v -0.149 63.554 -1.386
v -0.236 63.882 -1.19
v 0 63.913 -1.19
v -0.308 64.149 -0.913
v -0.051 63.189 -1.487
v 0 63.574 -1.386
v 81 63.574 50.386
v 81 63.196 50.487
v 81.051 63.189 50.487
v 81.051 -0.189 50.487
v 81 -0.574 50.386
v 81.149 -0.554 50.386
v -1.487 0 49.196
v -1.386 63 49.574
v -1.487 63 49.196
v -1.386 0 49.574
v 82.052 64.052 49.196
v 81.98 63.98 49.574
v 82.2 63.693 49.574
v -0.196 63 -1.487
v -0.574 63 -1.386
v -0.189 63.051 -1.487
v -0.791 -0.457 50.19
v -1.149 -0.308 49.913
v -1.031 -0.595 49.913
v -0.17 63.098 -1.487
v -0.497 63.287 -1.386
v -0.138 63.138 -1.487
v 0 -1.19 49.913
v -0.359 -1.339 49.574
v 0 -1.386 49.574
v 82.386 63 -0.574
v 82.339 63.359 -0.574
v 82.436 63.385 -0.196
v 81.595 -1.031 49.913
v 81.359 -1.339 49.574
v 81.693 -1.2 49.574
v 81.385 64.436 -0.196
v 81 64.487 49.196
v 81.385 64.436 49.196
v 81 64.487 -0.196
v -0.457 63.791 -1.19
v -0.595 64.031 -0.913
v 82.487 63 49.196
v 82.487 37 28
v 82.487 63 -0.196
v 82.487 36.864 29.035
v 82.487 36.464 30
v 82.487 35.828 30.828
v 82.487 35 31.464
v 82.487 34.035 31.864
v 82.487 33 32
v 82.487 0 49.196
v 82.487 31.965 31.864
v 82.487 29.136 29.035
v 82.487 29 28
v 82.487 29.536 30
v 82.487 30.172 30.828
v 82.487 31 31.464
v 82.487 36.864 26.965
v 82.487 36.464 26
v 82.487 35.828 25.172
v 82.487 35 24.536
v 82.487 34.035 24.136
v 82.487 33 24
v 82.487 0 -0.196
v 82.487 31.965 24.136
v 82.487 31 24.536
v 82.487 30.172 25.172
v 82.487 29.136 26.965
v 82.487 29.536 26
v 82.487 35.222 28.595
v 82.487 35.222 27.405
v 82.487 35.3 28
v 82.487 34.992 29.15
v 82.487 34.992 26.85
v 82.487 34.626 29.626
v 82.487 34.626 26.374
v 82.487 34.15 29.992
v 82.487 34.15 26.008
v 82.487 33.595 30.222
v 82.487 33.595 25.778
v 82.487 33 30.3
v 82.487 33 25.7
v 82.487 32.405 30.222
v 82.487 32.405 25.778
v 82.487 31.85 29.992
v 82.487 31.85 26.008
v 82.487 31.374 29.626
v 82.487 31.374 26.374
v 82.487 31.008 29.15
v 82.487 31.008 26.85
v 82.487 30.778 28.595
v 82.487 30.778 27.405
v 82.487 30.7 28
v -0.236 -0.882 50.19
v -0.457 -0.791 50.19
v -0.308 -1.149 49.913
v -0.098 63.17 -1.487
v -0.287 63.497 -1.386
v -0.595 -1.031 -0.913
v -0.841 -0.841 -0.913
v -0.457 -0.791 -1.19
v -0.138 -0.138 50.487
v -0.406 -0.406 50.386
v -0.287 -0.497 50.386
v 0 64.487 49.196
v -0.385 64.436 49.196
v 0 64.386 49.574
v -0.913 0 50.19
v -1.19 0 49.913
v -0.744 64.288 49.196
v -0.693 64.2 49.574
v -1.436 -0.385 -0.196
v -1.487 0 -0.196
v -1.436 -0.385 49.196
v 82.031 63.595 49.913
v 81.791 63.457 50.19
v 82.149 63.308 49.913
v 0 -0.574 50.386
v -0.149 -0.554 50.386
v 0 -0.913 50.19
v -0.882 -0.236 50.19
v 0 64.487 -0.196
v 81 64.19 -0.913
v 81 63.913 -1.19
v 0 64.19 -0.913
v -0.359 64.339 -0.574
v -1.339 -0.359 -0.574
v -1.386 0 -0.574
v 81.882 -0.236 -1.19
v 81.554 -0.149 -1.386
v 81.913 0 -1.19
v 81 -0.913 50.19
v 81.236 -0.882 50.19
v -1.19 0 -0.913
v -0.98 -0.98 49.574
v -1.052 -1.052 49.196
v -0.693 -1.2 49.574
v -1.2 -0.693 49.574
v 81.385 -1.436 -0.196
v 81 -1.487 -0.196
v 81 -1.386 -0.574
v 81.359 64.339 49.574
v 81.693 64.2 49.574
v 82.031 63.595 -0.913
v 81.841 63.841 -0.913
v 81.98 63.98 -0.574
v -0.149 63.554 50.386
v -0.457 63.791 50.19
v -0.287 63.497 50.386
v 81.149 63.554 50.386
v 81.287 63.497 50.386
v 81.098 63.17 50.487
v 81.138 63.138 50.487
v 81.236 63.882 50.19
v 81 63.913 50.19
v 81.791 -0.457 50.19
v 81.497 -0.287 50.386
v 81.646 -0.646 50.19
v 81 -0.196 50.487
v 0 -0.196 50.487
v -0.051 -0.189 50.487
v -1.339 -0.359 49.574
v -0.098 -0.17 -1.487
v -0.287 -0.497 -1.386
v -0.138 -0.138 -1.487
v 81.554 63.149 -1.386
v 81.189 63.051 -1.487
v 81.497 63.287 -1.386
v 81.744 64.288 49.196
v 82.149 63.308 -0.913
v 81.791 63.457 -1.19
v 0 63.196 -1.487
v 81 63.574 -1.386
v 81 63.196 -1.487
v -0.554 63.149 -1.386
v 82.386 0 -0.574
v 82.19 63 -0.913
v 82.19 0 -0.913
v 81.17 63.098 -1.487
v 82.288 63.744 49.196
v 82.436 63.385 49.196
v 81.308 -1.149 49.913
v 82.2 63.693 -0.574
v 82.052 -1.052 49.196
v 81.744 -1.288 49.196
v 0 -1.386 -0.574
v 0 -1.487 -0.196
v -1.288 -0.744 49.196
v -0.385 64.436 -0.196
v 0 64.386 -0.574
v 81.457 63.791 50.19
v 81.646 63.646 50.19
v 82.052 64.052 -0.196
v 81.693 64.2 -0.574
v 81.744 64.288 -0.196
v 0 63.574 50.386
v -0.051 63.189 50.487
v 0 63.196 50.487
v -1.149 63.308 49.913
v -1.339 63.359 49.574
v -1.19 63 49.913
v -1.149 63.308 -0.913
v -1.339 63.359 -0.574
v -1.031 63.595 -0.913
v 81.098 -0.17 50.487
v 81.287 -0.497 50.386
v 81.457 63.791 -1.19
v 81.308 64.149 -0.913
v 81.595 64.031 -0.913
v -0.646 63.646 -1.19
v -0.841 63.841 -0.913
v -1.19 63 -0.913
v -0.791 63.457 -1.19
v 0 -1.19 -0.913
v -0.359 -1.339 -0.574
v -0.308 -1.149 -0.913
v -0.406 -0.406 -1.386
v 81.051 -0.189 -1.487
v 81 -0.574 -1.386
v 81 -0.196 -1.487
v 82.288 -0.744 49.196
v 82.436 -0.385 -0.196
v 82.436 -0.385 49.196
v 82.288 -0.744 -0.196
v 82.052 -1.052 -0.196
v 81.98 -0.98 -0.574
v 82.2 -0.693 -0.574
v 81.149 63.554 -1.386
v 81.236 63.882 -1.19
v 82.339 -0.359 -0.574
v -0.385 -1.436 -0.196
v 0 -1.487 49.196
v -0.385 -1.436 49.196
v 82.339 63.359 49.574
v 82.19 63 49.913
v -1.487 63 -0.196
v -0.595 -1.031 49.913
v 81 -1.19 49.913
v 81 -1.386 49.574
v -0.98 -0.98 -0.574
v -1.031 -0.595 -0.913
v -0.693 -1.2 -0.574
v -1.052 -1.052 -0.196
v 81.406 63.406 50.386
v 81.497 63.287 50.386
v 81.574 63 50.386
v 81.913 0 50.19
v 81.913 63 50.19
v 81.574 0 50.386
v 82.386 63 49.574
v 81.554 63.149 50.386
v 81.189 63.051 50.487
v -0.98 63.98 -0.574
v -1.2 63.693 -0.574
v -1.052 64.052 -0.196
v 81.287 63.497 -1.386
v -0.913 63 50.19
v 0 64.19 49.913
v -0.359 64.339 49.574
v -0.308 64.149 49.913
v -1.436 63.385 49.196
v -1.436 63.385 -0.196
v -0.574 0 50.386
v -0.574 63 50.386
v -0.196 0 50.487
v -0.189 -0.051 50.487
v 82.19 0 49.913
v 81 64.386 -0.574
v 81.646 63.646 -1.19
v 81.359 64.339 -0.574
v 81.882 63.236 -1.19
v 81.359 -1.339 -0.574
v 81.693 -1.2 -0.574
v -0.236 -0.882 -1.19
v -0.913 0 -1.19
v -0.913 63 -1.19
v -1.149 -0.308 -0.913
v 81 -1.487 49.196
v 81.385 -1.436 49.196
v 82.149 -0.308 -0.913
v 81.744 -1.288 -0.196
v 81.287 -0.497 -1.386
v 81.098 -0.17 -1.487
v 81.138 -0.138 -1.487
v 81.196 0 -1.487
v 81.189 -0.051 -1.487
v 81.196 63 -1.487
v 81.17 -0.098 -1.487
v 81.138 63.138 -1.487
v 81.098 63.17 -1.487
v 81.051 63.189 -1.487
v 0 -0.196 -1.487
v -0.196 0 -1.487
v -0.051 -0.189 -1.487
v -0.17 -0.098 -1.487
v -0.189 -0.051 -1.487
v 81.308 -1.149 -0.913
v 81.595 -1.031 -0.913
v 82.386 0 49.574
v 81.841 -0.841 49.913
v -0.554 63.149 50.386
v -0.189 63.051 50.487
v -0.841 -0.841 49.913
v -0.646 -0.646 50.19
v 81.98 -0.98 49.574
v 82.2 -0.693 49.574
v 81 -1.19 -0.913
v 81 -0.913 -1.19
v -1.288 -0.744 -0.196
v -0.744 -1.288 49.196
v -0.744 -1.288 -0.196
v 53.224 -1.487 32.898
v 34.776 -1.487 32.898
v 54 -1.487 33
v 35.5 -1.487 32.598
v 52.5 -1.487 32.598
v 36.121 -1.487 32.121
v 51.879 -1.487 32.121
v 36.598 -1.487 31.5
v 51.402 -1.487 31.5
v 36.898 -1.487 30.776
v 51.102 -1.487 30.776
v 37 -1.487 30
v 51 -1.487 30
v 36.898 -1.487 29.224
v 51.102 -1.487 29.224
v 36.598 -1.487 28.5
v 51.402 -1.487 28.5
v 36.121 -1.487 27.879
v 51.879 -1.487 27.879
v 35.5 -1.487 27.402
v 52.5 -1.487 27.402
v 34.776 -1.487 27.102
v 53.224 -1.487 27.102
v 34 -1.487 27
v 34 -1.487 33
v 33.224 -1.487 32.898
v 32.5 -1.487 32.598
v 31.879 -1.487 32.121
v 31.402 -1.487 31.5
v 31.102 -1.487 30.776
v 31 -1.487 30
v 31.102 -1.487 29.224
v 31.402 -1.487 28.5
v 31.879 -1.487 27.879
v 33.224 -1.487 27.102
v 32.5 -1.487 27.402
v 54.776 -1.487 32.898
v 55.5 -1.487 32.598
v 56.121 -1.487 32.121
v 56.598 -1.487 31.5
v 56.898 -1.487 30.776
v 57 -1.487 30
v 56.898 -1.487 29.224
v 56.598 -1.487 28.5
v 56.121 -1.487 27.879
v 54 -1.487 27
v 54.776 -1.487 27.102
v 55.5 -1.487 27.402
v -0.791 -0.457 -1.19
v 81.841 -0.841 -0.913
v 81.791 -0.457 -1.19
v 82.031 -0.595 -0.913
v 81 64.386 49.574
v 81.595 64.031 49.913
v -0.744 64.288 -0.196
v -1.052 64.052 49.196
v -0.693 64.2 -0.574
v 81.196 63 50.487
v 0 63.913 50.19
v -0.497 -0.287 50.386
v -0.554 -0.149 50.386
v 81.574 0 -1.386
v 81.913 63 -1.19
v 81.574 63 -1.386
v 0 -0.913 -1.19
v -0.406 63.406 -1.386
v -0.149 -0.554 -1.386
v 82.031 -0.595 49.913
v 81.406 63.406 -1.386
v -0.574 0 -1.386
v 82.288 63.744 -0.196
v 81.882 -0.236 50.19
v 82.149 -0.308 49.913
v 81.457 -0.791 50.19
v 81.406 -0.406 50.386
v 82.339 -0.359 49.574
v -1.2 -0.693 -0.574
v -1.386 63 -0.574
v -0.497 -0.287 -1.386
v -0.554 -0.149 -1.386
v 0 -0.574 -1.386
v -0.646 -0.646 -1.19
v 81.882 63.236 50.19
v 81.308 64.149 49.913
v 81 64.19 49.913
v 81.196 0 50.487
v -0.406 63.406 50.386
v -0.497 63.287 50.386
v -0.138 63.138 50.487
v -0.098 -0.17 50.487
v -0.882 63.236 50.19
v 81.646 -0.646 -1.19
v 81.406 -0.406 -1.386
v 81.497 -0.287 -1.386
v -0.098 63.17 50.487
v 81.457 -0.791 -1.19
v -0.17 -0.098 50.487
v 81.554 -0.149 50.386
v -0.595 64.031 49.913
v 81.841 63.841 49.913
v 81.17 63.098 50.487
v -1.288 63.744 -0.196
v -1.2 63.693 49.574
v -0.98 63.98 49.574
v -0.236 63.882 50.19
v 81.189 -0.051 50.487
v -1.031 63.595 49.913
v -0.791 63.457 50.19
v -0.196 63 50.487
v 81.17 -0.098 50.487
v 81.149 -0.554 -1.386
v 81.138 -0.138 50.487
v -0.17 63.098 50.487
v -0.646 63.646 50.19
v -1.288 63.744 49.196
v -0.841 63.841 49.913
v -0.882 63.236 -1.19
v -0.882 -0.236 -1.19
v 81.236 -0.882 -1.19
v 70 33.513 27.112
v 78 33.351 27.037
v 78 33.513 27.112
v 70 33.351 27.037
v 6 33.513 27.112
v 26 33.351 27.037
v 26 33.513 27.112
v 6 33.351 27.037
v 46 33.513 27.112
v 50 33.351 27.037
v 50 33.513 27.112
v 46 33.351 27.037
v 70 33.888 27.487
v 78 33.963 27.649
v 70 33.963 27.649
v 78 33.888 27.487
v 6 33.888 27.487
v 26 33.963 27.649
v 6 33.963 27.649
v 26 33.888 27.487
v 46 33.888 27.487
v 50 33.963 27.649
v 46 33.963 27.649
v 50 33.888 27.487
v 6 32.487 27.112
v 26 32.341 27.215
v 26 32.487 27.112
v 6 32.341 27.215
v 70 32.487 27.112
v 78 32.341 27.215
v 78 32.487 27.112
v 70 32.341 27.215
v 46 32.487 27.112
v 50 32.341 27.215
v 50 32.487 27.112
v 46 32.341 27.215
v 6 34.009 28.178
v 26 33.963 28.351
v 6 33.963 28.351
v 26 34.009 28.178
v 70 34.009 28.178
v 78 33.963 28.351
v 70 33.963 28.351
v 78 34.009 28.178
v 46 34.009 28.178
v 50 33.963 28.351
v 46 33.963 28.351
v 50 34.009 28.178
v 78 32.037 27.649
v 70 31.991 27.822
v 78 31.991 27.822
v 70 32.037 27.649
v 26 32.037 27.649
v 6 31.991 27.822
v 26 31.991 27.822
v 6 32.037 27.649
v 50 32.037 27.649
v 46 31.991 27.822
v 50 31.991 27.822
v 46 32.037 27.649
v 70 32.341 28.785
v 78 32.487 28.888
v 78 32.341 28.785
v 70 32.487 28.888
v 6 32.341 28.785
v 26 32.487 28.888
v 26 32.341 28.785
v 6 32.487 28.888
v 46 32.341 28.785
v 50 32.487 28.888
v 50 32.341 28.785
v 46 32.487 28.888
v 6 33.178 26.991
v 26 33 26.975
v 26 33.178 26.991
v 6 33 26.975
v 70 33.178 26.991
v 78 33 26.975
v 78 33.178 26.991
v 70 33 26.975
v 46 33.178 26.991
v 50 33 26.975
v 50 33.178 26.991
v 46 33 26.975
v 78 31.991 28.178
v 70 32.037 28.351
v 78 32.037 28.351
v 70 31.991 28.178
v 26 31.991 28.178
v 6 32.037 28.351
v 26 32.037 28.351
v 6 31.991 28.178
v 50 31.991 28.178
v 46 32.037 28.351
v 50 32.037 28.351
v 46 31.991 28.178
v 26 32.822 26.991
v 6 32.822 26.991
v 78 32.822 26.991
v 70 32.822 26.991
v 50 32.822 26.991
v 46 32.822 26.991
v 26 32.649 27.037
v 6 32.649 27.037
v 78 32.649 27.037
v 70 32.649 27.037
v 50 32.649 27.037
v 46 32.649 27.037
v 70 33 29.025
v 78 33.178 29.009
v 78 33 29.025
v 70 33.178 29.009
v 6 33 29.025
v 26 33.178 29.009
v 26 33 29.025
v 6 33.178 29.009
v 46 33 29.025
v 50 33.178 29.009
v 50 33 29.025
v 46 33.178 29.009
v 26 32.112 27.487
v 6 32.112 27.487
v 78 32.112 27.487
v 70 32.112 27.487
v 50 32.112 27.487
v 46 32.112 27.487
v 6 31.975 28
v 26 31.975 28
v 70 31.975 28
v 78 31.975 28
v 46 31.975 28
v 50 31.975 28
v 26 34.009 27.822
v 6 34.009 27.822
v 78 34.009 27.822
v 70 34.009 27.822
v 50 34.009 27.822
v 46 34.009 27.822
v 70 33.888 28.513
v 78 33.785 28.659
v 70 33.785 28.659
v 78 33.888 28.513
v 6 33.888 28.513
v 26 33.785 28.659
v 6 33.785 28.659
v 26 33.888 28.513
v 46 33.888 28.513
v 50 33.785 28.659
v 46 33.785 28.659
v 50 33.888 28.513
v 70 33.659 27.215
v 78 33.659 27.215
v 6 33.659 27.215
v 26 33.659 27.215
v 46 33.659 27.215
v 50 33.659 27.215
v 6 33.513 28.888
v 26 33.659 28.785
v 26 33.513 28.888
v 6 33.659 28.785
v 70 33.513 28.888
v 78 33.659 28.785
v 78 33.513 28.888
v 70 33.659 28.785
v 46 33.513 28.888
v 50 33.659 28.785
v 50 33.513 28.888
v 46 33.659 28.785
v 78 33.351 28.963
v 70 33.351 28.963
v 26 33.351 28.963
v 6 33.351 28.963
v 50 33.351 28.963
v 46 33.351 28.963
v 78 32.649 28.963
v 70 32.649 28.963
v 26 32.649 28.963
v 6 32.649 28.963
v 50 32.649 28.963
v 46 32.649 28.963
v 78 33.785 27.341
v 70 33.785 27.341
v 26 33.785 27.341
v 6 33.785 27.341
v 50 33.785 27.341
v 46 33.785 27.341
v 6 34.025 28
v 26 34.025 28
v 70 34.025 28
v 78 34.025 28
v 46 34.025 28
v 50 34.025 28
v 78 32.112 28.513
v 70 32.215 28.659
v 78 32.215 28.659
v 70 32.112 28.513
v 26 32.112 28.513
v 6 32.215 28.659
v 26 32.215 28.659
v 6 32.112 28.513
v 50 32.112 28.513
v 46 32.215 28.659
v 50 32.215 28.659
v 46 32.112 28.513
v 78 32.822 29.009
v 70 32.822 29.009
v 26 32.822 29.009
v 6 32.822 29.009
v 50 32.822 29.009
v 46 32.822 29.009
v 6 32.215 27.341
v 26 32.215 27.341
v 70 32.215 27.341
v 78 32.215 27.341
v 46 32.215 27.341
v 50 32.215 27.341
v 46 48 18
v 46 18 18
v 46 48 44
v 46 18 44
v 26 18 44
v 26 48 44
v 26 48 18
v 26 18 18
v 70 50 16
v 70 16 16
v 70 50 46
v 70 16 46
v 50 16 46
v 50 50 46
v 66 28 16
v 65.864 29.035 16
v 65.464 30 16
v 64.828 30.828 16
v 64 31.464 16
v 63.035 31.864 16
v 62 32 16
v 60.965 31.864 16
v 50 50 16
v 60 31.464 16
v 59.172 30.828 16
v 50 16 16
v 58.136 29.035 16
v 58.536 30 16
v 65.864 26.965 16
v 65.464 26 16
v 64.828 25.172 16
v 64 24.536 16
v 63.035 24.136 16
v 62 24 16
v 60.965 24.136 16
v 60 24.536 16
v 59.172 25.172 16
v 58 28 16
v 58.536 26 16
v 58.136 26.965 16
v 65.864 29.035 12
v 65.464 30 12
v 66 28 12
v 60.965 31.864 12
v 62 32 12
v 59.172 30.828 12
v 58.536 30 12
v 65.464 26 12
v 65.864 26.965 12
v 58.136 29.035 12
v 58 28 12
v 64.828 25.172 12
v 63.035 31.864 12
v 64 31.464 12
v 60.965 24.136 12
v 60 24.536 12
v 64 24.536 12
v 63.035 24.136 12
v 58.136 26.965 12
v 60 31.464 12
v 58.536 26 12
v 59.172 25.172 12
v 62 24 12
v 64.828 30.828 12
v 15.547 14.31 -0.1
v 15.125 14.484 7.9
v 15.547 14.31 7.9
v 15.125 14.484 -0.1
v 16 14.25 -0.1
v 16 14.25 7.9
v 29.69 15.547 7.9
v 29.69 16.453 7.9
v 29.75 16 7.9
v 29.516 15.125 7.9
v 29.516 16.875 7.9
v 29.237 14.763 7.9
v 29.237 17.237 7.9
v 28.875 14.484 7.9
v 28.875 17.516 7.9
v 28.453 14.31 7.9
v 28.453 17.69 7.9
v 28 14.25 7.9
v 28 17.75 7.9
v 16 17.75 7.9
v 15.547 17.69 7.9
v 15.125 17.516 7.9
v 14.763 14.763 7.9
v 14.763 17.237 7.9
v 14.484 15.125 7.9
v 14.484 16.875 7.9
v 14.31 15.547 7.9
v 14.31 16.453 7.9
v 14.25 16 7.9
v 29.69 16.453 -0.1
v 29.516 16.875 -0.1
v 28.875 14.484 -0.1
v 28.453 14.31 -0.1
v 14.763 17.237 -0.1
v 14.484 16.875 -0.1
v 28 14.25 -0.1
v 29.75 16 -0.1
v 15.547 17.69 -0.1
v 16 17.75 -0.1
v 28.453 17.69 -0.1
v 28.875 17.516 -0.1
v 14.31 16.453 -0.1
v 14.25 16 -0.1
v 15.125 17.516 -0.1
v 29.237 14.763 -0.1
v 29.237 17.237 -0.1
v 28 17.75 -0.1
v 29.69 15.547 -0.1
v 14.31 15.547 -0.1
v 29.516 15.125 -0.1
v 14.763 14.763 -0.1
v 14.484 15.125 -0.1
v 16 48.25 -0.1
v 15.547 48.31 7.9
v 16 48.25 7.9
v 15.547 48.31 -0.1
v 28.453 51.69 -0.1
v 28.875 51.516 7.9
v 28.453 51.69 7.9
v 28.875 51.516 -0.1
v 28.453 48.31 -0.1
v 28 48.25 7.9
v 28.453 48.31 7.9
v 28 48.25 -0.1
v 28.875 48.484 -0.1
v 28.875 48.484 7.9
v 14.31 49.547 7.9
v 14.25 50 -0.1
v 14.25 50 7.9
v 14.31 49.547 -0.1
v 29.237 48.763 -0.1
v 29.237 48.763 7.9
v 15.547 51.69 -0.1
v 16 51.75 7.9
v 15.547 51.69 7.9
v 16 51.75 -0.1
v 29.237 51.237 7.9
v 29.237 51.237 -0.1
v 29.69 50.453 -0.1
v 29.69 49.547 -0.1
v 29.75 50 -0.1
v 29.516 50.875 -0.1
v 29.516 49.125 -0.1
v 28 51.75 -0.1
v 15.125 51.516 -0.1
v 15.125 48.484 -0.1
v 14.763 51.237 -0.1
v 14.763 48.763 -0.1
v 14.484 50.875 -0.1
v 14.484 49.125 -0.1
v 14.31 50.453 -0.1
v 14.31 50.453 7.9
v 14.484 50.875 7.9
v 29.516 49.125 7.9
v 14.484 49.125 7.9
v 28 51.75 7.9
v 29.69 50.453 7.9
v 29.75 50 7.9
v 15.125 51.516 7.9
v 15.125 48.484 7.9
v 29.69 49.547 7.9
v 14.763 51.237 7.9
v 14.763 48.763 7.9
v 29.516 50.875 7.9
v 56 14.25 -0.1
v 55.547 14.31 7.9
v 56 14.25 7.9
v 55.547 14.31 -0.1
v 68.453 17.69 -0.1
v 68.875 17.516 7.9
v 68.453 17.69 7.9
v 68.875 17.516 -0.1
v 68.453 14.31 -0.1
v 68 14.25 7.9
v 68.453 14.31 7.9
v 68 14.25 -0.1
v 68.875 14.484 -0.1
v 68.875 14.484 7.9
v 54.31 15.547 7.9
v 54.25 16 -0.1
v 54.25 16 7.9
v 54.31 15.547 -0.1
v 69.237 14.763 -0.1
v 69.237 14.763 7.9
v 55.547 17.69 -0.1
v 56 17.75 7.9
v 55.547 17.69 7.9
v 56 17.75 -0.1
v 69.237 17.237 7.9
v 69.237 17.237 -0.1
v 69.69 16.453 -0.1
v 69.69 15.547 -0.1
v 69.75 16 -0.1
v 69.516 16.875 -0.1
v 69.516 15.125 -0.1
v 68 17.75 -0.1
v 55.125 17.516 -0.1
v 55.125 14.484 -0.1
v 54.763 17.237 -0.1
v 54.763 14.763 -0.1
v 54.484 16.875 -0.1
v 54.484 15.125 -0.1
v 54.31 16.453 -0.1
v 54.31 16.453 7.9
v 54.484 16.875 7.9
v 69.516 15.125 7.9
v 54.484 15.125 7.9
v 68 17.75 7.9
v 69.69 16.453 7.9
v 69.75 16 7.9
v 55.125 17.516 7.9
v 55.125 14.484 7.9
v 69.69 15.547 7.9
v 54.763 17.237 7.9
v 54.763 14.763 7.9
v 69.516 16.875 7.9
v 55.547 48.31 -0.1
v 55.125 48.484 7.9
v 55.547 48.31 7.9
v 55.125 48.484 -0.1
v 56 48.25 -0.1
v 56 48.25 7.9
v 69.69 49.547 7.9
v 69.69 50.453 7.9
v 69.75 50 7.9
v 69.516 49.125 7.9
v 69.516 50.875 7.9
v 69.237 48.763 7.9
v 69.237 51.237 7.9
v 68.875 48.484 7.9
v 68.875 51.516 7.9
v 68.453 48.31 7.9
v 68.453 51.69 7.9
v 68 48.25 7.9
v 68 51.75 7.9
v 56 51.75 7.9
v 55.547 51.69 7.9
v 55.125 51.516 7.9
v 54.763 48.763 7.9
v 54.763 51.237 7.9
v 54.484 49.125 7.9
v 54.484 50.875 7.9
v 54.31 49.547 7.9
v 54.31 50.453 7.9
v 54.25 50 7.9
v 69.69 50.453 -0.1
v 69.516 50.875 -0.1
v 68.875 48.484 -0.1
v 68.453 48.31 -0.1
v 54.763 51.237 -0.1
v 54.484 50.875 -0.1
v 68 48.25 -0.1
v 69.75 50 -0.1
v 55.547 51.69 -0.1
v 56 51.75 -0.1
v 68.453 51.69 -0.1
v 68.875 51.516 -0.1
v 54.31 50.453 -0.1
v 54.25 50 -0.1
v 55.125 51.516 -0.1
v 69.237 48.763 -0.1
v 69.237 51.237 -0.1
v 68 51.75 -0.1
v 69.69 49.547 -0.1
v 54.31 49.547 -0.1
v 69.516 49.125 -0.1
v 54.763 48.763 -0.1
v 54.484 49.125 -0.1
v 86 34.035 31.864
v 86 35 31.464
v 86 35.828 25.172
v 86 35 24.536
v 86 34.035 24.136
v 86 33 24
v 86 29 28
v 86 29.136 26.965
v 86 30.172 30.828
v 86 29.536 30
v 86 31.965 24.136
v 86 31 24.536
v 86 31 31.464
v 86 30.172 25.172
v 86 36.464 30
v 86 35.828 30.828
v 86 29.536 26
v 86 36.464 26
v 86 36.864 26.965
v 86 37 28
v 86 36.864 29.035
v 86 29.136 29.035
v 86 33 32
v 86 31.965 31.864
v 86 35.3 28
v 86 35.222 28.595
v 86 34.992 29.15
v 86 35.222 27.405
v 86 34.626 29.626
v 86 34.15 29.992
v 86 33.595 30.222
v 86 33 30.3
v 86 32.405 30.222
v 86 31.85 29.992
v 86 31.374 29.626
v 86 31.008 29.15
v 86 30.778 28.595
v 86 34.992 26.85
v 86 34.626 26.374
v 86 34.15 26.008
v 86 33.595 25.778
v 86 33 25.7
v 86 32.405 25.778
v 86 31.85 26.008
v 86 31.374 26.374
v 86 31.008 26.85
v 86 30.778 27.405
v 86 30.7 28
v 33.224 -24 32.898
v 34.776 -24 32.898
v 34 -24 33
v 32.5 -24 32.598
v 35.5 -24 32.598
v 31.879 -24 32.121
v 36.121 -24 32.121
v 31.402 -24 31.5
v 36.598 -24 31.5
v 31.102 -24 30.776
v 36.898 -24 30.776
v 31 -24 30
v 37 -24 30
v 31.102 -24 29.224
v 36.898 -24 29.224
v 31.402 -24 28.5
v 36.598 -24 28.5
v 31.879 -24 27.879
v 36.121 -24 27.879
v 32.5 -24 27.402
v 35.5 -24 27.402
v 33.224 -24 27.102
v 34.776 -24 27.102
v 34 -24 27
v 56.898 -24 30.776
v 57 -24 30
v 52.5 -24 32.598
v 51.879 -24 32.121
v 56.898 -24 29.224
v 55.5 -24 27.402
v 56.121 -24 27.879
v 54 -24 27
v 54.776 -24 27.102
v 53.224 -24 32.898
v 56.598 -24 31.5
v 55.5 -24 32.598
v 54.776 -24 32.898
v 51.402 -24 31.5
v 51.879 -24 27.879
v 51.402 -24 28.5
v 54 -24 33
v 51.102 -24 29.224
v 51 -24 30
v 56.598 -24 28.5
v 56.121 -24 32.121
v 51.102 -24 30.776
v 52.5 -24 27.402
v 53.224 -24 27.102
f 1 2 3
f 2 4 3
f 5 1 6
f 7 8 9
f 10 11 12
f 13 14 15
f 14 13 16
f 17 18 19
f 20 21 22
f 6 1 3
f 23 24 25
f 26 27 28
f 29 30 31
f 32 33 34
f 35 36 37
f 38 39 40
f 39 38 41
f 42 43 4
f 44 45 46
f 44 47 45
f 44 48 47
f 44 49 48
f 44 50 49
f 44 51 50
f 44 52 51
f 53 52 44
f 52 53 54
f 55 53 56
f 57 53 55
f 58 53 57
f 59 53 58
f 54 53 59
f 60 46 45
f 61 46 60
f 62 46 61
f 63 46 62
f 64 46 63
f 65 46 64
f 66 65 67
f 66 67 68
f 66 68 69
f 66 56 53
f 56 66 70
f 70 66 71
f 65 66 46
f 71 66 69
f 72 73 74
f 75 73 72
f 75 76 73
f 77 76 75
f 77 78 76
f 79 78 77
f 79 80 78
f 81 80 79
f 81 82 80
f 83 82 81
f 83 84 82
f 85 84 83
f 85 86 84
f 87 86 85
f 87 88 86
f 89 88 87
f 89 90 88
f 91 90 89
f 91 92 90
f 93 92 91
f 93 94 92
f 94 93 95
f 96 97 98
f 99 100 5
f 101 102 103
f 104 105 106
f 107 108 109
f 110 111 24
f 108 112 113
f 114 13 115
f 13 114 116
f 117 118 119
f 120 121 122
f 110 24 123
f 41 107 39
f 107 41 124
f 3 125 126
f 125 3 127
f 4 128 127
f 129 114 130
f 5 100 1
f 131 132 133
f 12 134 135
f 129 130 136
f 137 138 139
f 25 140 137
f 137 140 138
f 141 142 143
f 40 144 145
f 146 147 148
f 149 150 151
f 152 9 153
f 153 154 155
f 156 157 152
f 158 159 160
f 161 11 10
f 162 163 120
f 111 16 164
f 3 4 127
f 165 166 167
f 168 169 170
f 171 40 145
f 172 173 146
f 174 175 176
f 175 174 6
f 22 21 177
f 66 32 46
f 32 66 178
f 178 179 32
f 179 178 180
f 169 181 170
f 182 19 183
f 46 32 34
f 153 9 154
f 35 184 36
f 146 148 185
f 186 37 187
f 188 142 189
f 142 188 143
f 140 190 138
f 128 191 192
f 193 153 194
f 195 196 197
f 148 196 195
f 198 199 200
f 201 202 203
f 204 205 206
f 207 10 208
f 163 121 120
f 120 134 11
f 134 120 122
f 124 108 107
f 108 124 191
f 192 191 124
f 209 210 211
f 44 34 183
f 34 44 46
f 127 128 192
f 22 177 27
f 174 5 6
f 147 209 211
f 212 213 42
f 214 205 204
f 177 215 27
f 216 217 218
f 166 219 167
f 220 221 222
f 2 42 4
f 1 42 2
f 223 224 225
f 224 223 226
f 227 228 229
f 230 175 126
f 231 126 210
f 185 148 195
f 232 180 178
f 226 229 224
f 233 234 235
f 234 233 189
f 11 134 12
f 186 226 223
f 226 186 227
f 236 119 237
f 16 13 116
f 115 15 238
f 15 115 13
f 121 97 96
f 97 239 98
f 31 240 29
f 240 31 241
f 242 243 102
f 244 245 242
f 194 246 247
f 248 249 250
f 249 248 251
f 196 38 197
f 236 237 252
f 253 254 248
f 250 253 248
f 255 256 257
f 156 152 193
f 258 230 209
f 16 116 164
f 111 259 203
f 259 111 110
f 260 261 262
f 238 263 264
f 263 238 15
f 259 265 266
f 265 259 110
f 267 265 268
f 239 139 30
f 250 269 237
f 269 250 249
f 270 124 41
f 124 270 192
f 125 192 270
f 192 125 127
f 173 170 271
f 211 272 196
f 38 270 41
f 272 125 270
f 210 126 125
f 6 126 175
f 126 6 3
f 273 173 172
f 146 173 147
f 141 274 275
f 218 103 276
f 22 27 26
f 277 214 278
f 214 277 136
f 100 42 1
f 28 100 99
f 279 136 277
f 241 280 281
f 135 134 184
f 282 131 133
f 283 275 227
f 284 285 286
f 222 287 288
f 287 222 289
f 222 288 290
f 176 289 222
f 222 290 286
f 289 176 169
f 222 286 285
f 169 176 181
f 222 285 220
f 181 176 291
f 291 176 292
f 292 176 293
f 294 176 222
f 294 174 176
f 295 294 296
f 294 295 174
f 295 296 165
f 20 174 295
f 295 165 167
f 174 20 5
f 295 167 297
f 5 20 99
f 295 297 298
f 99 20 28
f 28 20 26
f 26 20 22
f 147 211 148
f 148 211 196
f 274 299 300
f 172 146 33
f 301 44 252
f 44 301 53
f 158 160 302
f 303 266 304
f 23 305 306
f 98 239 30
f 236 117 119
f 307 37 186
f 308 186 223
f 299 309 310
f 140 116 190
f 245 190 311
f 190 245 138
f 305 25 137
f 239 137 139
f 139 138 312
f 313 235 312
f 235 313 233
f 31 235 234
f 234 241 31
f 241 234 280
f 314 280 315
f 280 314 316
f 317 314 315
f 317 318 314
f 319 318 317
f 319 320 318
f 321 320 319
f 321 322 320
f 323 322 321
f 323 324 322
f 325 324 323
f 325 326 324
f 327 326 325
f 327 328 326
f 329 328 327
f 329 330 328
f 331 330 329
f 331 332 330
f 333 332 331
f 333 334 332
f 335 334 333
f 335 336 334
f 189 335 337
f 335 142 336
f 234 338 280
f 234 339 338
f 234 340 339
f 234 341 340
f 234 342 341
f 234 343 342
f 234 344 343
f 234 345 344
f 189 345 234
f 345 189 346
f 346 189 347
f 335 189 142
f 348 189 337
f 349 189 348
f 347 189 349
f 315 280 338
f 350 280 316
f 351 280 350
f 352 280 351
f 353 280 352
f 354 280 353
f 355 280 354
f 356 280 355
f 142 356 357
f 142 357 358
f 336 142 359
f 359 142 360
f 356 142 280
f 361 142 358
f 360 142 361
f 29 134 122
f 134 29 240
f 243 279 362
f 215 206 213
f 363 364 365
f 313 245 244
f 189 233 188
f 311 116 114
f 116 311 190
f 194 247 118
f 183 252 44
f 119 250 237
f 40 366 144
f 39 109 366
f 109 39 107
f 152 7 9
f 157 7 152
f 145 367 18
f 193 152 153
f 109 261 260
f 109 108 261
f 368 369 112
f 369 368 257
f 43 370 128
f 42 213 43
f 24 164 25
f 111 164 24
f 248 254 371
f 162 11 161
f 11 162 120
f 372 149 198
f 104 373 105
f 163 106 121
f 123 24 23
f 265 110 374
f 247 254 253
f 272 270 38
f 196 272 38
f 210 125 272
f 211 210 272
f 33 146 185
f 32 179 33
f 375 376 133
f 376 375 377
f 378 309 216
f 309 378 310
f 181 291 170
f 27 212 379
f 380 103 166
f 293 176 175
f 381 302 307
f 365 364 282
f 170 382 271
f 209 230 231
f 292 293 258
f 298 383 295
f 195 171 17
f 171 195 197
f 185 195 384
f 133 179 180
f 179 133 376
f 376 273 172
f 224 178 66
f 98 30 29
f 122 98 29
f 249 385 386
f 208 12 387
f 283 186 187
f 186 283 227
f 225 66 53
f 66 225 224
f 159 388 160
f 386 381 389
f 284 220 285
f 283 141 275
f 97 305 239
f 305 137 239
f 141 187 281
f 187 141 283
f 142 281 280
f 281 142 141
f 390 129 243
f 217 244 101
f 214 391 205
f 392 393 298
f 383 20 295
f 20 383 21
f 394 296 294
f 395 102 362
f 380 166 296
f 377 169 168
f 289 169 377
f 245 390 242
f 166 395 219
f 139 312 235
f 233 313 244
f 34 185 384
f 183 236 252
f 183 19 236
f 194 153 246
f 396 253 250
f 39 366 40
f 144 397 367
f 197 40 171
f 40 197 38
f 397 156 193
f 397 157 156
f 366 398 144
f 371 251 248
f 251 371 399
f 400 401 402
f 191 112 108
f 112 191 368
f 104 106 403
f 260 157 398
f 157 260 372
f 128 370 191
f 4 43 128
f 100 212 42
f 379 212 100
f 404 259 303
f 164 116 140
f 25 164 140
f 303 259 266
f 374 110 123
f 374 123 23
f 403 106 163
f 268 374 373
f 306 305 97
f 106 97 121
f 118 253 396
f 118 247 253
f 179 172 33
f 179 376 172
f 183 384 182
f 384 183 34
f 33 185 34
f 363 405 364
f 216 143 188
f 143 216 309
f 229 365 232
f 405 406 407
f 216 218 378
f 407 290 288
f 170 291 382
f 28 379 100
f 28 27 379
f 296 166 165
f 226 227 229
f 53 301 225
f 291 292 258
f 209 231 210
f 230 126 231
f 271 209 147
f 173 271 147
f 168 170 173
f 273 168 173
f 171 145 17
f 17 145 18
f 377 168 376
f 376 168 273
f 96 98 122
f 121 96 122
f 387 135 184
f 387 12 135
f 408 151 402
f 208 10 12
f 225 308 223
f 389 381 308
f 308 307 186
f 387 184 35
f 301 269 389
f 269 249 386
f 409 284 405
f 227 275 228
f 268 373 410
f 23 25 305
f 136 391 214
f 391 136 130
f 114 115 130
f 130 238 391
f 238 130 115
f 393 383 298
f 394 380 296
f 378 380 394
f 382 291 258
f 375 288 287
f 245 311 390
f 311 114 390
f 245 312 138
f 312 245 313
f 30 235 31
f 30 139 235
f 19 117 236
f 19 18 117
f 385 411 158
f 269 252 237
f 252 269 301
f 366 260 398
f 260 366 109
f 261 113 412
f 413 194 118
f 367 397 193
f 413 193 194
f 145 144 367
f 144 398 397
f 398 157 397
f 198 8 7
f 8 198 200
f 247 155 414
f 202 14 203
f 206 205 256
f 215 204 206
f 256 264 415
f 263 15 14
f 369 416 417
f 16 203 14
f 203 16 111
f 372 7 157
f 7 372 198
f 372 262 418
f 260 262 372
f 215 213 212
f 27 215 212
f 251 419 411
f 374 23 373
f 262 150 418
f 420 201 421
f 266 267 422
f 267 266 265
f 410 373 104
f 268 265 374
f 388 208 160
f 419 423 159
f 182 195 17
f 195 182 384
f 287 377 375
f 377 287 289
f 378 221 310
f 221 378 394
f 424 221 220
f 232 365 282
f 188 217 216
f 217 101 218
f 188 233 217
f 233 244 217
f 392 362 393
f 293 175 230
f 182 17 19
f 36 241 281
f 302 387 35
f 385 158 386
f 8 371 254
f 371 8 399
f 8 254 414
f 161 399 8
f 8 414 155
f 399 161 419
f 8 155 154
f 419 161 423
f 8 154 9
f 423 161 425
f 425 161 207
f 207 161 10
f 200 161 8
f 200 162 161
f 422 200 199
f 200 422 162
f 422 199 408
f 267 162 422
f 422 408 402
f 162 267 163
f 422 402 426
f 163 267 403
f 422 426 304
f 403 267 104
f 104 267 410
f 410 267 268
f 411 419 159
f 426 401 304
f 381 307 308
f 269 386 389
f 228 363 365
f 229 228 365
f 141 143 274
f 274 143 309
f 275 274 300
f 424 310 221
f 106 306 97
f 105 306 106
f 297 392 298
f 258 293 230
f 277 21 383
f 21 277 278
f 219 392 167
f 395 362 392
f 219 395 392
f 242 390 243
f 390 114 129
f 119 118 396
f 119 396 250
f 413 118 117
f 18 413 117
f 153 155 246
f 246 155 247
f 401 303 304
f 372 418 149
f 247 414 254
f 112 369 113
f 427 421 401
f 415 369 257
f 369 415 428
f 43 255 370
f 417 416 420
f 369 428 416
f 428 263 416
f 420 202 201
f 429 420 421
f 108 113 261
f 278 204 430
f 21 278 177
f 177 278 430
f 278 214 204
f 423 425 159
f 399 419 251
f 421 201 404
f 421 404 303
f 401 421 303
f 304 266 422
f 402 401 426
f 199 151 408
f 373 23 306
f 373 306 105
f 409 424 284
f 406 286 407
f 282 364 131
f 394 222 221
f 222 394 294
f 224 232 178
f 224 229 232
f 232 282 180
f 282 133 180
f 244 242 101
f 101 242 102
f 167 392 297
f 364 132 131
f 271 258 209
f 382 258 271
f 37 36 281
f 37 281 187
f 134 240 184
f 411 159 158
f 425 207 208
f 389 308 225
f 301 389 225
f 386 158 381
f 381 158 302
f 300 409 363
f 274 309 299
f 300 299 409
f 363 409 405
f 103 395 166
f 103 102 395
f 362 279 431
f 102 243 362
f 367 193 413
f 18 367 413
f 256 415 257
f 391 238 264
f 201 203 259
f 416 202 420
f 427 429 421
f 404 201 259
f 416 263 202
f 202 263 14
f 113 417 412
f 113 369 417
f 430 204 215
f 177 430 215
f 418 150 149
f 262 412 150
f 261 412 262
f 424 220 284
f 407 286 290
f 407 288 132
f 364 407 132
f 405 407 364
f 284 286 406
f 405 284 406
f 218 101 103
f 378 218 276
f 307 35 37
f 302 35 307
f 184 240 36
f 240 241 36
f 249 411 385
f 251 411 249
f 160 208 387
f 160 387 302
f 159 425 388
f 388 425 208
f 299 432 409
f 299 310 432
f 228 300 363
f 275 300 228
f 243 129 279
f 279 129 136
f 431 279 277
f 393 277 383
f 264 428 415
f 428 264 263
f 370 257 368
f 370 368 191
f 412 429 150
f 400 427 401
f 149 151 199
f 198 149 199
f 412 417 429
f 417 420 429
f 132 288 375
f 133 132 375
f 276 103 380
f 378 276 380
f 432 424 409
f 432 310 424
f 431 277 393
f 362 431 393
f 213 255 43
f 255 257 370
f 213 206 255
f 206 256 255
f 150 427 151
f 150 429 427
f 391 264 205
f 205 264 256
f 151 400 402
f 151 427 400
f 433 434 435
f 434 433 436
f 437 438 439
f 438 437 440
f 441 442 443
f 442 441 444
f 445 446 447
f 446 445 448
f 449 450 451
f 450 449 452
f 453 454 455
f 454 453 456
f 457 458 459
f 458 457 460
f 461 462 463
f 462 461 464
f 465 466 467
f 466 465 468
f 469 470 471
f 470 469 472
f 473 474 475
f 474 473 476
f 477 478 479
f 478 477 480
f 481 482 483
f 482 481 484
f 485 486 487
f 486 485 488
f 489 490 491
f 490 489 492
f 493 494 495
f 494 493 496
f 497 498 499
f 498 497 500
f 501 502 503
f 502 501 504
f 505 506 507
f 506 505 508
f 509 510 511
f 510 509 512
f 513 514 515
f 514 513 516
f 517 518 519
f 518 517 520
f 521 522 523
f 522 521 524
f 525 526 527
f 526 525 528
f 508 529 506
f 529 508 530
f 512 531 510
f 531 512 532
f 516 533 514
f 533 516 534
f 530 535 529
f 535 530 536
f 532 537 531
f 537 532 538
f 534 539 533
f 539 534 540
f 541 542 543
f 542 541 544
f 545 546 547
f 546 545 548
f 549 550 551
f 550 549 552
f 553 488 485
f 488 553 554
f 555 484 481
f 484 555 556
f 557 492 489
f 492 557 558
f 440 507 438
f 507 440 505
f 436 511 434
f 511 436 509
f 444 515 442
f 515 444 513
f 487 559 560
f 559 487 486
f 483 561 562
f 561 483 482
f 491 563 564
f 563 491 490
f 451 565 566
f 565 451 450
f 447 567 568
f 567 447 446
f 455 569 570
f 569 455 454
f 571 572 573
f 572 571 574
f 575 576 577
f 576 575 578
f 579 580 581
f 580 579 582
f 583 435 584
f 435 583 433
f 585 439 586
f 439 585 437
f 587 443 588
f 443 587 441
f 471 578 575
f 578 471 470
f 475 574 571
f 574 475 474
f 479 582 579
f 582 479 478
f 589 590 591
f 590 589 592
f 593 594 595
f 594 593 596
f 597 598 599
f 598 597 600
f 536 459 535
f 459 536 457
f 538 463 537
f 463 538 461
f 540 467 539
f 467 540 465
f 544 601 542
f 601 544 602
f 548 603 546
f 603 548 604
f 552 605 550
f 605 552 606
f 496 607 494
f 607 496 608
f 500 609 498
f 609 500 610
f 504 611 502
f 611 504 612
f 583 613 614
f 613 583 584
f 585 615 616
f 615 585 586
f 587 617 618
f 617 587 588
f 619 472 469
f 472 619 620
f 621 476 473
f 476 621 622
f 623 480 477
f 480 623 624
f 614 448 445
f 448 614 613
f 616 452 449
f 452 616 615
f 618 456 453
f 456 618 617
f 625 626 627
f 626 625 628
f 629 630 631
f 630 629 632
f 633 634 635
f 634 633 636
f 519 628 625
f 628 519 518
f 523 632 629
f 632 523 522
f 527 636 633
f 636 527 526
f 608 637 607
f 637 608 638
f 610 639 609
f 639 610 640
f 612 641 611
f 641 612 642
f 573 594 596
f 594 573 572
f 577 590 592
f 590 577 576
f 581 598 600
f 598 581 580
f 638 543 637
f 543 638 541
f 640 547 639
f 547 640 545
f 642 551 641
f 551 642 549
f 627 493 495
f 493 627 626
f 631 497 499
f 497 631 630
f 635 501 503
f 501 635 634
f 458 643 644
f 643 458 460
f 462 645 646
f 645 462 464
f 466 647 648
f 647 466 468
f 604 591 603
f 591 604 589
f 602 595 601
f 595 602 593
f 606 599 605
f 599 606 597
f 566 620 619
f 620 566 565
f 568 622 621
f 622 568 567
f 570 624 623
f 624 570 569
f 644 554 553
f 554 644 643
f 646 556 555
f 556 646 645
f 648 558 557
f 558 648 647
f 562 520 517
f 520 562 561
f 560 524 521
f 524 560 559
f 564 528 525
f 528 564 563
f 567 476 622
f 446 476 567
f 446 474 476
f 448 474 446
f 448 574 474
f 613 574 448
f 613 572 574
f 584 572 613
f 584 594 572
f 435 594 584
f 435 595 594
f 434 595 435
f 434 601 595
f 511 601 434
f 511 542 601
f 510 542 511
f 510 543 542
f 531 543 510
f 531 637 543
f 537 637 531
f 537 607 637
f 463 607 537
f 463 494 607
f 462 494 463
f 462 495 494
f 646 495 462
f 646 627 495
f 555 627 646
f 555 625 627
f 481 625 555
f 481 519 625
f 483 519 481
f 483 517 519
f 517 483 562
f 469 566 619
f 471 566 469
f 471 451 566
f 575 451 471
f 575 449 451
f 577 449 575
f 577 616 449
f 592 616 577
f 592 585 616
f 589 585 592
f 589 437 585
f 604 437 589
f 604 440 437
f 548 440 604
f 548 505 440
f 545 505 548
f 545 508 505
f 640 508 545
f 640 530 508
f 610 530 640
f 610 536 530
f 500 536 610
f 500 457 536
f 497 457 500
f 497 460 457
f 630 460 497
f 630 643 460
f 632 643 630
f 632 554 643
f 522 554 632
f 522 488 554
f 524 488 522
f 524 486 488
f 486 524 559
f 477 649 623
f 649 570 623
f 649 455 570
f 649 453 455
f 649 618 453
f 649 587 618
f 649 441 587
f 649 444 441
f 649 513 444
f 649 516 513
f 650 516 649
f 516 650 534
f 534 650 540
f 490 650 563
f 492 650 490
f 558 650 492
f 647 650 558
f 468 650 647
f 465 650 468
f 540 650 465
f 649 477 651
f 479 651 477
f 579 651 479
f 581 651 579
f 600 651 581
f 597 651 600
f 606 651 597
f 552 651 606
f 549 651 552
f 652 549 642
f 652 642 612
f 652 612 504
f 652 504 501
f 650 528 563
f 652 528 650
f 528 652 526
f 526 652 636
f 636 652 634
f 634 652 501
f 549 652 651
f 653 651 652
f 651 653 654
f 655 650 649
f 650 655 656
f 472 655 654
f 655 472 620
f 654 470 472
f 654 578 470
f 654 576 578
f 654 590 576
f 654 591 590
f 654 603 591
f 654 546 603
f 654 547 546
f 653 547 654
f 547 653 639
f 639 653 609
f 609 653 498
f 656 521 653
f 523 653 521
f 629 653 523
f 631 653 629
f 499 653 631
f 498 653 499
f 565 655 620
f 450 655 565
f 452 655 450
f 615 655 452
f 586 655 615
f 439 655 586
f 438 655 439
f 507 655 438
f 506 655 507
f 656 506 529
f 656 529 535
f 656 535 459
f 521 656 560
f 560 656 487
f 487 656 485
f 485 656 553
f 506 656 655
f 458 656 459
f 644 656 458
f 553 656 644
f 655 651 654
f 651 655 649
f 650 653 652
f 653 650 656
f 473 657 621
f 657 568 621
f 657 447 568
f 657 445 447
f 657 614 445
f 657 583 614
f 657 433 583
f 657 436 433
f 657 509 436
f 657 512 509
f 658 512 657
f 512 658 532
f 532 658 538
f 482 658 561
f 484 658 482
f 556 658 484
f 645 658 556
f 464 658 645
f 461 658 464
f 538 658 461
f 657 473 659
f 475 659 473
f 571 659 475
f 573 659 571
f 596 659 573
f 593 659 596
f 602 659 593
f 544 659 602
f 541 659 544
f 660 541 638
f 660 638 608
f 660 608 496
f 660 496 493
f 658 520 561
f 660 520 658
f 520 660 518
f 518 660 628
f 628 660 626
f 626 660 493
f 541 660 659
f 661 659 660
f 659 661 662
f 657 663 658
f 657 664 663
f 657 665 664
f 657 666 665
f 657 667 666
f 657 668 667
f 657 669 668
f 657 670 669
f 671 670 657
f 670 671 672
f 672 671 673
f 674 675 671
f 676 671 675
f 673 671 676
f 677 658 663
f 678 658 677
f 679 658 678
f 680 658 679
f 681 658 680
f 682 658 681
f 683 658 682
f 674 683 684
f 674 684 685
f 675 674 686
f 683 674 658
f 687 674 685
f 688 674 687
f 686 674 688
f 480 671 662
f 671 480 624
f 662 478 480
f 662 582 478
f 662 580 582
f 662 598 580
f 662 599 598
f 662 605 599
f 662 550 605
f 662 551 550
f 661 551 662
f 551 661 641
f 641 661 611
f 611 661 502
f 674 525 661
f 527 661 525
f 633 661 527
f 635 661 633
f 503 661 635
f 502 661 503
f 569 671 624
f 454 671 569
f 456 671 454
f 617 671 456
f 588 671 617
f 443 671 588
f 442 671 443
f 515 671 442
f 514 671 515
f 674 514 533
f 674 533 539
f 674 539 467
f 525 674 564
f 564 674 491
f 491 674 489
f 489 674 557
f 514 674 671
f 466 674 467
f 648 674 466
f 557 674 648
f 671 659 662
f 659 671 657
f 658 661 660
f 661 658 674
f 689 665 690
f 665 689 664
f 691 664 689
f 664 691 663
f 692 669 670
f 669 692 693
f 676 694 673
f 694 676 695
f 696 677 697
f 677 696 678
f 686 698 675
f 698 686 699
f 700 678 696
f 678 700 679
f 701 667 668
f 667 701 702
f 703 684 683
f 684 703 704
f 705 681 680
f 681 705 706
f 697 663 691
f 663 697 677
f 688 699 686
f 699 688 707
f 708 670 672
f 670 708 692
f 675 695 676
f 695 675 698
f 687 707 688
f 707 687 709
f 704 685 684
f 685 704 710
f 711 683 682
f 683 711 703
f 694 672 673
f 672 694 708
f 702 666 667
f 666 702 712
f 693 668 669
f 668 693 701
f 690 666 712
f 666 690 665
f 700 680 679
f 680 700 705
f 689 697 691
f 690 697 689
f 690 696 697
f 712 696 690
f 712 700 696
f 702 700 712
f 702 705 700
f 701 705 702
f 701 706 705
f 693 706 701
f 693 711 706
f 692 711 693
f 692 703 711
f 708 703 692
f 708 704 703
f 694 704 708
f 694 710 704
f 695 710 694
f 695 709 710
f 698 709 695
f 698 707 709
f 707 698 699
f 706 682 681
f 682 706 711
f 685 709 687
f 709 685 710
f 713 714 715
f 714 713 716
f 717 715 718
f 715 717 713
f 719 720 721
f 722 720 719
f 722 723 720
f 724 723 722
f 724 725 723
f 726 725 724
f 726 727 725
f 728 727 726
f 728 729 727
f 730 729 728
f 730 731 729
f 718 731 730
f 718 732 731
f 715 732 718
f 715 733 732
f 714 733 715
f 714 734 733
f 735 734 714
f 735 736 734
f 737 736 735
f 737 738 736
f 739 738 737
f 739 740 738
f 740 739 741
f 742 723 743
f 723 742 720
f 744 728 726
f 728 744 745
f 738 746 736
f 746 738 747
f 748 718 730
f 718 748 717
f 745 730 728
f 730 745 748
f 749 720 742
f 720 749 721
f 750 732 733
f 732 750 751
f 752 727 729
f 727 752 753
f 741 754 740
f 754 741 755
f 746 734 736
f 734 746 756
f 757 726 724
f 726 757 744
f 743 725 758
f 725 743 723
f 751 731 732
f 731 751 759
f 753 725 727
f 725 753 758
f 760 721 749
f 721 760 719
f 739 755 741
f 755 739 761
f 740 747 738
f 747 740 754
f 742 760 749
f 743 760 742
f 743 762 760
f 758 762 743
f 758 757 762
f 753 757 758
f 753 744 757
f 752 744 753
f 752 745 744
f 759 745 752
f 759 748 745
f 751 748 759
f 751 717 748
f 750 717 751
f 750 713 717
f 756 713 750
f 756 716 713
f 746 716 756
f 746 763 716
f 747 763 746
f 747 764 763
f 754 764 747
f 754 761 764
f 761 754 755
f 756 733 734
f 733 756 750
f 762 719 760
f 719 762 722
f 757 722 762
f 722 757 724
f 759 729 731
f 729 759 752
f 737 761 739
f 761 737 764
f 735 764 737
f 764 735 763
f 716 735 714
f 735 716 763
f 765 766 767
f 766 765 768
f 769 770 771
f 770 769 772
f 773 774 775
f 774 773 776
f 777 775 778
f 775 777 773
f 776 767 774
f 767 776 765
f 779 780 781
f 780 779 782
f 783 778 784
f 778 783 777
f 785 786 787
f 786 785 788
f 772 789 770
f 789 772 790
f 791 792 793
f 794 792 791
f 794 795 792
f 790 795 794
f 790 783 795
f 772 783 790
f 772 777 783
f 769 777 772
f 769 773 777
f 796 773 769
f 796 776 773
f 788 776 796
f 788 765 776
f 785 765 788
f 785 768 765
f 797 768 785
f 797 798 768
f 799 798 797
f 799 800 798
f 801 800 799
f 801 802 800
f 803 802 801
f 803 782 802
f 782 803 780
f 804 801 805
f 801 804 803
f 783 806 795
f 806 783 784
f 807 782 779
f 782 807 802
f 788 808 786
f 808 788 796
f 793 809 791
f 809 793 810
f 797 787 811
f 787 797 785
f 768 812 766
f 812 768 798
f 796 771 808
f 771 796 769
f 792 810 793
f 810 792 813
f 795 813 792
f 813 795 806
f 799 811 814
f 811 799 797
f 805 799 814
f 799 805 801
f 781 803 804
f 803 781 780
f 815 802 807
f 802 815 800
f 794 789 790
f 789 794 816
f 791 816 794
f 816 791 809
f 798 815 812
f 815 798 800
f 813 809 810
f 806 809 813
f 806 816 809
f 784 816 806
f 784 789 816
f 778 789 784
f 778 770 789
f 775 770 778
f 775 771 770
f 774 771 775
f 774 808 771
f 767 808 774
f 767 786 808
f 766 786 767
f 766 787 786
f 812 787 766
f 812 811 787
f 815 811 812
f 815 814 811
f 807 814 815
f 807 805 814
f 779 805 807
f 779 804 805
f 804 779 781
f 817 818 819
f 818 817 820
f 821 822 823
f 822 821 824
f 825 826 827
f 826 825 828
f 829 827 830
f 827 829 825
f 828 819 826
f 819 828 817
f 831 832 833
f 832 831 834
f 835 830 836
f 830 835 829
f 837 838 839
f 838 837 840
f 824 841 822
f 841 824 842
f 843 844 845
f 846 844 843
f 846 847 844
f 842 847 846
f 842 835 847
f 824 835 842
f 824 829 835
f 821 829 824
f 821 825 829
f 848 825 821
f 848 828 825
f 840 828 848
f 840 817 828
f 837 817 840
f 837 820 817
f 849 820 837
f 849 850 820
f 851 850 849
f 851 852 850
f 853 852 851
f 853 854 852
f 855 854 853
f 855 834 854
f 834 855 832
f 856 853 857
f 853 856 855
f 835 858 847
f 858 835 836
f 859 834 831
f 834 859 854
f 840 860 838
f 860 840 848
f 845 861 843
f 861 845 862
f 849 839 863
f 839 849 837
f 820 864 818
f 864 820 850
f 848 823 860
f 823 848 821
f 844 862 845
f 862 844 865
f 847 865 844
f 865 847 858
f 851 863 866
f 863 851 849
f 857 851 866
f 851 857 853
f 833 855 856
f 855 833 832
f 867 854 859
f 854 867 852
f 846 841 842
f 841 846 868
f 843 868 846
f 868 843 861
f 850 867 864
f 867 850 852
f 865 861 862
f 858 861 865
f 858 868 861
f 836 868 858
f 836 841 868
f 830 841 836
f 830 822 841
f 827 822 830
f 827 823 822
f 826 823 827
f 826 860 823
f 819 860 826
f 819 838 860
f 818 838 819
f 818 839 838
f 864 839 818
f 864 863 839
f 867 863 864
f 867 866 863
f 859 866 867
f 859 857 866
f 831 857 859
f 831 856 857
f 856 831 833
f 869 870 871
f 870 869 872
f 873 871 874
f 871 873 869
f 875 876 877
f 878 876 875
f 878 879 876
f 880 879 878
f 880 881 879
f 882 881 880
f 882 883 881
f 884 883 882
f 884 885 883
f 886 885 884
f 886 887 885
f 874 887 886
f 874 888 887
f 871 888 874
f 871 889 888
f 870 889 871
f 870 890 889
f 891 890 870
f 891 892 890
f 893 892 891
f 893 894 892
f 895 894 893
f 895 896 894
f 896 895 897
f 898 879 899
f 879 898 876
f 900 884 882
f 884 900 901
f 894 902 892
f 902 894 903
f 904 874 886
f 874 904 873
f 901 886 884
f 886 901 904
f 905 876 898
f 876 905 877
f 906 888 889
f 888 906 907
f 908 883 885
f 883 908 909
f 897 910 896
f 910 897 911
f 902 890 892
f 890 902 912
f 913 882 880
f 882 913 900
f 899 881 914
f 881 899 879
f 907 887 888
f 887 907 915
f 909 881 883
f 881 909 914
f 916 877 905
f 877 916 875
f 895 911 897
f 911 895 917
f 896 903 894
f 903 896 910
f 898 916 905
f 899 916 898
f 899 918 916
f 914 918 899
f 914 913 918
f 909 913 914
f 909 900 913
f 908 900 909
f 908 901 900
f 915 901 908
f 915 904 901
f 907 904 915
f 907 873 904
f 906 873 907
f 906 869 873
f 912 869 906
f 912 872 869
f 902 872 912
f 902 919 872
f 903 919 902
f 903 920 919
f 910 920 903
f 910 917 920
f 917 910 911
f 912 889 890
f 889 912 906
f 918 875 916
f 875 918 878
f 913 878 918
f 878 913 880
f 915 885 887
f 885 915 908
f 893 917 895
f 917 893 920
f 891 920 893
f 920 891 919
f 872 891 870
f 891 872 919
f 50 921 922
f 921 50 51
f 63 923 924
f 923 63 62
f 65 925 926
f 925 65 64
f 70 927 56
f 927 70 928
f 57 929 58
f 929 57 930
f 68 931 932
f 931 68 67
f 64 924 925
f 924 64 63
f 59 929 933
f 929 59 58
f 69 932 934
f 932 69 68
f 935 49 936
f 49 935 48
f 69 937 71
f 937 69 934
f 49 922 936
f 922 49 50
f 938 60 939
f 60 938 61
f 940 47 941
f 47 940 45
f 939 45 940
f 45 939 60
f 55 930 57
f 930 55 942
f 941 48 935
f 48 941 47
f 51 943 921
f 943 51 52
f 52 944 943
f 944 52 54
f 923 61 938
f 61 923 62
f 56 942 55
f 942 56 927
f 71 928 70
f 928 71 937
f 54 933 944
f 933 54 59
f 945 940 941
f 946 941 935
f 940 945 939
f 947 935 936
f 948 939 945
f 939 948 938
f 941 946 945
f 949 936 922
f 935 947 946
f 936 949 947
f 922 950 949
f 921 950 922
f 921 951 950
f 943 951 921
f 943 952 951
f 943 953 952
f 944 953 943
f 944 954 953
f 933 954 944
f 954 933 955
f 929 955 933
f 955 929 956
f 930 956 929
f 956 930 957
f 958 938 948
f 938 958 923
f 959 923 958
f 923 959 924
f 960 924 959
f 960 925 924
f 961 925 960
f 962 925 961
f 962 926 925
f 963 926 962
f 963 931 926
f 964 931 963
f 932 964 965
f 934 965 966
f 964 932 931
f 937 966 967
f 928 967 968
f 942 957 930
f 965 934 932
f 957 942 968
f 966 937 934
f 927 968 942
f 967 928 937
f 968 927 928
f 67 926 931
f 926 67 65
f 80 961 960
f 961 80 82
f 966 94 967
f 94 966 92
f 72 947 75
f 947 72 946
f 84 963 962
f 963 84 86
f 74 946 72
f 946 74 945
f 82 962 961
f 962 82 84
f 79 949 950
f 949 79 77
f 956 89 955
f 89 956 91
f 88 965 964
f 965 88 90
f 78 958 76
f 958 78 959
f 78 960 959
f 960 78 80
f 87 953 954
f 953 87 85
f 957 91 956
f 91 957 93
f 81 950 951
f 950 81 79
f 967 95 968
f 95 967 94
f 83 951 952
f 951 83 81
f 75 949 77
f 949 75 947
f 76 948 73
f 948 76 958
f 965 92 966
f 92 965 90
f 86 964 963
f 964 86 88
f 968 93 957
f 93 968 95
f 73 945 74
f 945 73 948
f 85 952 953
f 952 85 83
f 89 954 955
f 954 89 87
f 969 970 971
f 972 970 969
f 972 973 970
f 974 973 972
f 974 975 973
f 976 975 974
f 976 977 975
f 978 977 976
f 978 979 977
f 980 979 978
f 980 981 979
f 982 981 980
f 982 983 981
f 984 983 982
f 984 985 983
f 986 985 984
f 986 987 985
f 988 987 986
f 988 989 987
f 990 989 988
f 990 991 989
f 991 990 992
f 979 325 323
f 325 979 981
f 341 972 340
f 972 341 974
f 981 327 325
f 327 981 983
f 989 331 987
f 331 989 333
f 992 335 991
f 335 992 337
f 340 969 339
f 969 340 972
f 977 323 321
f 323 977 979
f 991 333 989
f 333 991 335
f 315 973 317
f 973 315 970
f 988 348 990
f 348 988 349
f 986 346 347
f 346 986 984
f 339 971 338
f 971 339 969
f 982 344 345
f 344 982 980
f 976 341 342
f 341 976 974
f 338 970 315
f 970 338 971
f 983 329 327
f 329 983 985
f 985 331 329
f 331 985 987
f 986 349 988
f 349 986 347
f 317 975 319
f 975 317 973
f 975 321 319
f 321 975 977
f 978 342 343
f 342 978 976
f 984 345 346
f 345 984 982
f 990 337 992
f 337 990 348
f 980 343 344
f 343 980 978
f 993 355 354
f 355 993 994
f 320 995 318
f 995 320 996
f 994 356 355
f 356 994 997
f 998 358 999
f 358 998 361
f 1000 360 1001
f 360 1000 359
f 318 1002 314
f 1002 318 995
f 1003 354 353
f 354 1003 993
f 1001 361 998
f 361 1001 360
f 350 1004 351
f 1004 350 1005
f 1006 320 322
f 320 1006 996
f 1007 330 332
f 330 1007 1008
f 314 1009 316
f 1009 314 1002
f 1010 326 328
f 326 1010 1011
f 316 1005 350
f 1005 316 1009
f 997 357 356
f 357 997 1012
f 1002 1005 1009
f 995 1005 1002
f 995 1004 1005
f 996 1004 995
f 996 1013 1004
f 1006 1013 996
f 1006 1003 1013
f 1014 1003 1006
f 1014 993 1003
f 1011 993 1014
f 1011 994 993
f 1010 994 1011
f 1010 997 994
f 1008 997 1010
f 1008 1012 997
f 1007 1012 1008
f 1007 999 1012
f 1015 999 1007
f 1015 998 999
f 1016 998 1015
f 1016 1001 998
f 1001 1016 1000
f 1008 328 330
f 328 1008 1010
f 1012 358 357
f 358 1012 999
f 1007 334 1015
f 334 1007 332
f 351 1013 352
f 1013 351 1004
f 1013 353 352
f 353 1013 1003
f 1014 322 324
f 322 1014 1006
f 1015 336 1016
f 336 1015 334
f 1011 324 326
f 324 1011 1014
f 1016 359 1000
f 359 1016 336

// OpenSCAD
// file: common.scad
// Shared constants and primitives for F1.1 mechanical design.

filament_diameter = 1.75;
ptfe_inner_diameter = 2.0;
mount_hole_diameter = 3.2;
mount_slot_width = 3.5;
mount_slot_length = 10.0;

module rounded_block(size_vec, radius = 2) {
    x = size_vec[0];
    y = size_vec[1];
    z = size_vec[2];

    minkowski() {
        cube([x - (2 * radius), y - (2 * radius), z - (2 * radius)], center = false);
        sphere(r = radius, $fn = 24);
    }
}

module m3_hole(height = 12, diameter = mount_hole_diameter) {
    cylinder(h = height, d = diameter, center = false, $fn = 32);
}

module slot_hole(length = mount_slot_length, width = mount_slot_width, height = 8) {
    hull() {
        translate([0, 0, 0]) {
            cylinder(h = height, d = width, center = false, $fn = 24);
        }
        translate([length, 0, 0]) {
            cylinder(h = height, d = width, center = false, $fn = 24);
        }
    }
}

module filament_channel(length = 30, diameter = ptfe_inner_diameter, axis = "x") {
    if (axis == "x") {
        rotate([0, 90, 0]) {
            cylinder(h = length, d = diameter, center = true, $fn = 36);
        }
    } else if (axis == "y") {
        rotate([90, 0, 0]) {
            cylinder(h = length, d = diameter, center = true, $fn = 36);
        }
    } else {
        cylinder(h = length, d = diameter, center = true, $fn = 36);
    }
}

module pc4_m6_fitting_port() {
    difference() {
        cylinder(h = 8, d = 8, center = false, $fn = 24);
        translate([0, 0, -0.5]) {
            cylinder(h = 9, d = 4.6, center = false, $fn = 24);
        }
    }
}

module modular_rail(width = 80, depth = 12, length = 210) {
    difference() {
        cube([length, width, depth], center = false);

        for (slot_x = [15 : 20 : length - 15]) {
            translate([slot_x, width * 0.5, 0]) {
                slot_hole(length = mount_slot_length, width = mount_slot_width, height = depth + 1);
            }
        }
    }
}
// main file
use <common.scad>;

// Encoder wheel mount with spring loaded idler arm.

module encoder_station() {
    difference() {
        rounded_block([84, 66, 52], radius = 1.5);

        // Filament path through encoder nip point.
        translate([42, 33, 28]) {
            filament_channel(length = 72, diameter = 2.05, axis = "x");
        }

        // Encoder wheel cavity.
        translate([26, 18, 18]) {
            cube([20, 30, 26], center = false);
        }

        // Idler arm cavity.
        translate([50, 16, 16]) {
            cube([20, 34, 30], center = false);
        }

        // Spring seat pocket.
        translate([62, 28, 12]) {
            cylinder(h = 16, d = 8, center = false, $fn = 24);
        }

        // Mounting slots.
        translate([16, 16, -0.1]) {
            slot_hole(length = 12, width = 3.5, height = 8);
        }
        translate([16, 50, -0.1]) {
            slot_hole(length = 12, width = 3.5, height = 8);
        }
        translate([56, 16, -0.1]) {
            slot_hole(length = 12, width = 3.5, height = 8);
        }
        translate([56, 50, -0.1]) {
            slot_hole(length = 12, width = 3.5, height = 8);
        }
    }

    // Encoder axle bosses.
    translate([34, 14, 30]) {
        rotate([90, 0, 0]) {
            cylinder(h = 38, d = 6, center = false, $fn = 24);
        }
    }

    translate([54, 14, 30]) {
        rotate([90, 0, 0]) {
            cylinder(h = 38, d = 6, center = false, $fn = 24);
        }
    }

    // PTFE fitting ports.
    translate([6, 33, 28]) {
        rotate([0, 90, 0]) {
            pc4_m6_fitting_port();
        }
    }

    translate([78, 33, 28]) {
        rotate([0, 90, 0]) {
            pc4_m6_fitting_port();
        }
    }
}

module encoder_idler_arm() {
    difference() {
        rounded_block([42, 14, 10], radius = 1);
        translate([6, 7, -0.1]) {
            m3_hole(height = 11, diameter = 3.2);
        }
        translate([32, 7, -0.1]) {
            m3_hole(height = 11, diameter = 3.2);
        }
    }
}

encoder_station();
